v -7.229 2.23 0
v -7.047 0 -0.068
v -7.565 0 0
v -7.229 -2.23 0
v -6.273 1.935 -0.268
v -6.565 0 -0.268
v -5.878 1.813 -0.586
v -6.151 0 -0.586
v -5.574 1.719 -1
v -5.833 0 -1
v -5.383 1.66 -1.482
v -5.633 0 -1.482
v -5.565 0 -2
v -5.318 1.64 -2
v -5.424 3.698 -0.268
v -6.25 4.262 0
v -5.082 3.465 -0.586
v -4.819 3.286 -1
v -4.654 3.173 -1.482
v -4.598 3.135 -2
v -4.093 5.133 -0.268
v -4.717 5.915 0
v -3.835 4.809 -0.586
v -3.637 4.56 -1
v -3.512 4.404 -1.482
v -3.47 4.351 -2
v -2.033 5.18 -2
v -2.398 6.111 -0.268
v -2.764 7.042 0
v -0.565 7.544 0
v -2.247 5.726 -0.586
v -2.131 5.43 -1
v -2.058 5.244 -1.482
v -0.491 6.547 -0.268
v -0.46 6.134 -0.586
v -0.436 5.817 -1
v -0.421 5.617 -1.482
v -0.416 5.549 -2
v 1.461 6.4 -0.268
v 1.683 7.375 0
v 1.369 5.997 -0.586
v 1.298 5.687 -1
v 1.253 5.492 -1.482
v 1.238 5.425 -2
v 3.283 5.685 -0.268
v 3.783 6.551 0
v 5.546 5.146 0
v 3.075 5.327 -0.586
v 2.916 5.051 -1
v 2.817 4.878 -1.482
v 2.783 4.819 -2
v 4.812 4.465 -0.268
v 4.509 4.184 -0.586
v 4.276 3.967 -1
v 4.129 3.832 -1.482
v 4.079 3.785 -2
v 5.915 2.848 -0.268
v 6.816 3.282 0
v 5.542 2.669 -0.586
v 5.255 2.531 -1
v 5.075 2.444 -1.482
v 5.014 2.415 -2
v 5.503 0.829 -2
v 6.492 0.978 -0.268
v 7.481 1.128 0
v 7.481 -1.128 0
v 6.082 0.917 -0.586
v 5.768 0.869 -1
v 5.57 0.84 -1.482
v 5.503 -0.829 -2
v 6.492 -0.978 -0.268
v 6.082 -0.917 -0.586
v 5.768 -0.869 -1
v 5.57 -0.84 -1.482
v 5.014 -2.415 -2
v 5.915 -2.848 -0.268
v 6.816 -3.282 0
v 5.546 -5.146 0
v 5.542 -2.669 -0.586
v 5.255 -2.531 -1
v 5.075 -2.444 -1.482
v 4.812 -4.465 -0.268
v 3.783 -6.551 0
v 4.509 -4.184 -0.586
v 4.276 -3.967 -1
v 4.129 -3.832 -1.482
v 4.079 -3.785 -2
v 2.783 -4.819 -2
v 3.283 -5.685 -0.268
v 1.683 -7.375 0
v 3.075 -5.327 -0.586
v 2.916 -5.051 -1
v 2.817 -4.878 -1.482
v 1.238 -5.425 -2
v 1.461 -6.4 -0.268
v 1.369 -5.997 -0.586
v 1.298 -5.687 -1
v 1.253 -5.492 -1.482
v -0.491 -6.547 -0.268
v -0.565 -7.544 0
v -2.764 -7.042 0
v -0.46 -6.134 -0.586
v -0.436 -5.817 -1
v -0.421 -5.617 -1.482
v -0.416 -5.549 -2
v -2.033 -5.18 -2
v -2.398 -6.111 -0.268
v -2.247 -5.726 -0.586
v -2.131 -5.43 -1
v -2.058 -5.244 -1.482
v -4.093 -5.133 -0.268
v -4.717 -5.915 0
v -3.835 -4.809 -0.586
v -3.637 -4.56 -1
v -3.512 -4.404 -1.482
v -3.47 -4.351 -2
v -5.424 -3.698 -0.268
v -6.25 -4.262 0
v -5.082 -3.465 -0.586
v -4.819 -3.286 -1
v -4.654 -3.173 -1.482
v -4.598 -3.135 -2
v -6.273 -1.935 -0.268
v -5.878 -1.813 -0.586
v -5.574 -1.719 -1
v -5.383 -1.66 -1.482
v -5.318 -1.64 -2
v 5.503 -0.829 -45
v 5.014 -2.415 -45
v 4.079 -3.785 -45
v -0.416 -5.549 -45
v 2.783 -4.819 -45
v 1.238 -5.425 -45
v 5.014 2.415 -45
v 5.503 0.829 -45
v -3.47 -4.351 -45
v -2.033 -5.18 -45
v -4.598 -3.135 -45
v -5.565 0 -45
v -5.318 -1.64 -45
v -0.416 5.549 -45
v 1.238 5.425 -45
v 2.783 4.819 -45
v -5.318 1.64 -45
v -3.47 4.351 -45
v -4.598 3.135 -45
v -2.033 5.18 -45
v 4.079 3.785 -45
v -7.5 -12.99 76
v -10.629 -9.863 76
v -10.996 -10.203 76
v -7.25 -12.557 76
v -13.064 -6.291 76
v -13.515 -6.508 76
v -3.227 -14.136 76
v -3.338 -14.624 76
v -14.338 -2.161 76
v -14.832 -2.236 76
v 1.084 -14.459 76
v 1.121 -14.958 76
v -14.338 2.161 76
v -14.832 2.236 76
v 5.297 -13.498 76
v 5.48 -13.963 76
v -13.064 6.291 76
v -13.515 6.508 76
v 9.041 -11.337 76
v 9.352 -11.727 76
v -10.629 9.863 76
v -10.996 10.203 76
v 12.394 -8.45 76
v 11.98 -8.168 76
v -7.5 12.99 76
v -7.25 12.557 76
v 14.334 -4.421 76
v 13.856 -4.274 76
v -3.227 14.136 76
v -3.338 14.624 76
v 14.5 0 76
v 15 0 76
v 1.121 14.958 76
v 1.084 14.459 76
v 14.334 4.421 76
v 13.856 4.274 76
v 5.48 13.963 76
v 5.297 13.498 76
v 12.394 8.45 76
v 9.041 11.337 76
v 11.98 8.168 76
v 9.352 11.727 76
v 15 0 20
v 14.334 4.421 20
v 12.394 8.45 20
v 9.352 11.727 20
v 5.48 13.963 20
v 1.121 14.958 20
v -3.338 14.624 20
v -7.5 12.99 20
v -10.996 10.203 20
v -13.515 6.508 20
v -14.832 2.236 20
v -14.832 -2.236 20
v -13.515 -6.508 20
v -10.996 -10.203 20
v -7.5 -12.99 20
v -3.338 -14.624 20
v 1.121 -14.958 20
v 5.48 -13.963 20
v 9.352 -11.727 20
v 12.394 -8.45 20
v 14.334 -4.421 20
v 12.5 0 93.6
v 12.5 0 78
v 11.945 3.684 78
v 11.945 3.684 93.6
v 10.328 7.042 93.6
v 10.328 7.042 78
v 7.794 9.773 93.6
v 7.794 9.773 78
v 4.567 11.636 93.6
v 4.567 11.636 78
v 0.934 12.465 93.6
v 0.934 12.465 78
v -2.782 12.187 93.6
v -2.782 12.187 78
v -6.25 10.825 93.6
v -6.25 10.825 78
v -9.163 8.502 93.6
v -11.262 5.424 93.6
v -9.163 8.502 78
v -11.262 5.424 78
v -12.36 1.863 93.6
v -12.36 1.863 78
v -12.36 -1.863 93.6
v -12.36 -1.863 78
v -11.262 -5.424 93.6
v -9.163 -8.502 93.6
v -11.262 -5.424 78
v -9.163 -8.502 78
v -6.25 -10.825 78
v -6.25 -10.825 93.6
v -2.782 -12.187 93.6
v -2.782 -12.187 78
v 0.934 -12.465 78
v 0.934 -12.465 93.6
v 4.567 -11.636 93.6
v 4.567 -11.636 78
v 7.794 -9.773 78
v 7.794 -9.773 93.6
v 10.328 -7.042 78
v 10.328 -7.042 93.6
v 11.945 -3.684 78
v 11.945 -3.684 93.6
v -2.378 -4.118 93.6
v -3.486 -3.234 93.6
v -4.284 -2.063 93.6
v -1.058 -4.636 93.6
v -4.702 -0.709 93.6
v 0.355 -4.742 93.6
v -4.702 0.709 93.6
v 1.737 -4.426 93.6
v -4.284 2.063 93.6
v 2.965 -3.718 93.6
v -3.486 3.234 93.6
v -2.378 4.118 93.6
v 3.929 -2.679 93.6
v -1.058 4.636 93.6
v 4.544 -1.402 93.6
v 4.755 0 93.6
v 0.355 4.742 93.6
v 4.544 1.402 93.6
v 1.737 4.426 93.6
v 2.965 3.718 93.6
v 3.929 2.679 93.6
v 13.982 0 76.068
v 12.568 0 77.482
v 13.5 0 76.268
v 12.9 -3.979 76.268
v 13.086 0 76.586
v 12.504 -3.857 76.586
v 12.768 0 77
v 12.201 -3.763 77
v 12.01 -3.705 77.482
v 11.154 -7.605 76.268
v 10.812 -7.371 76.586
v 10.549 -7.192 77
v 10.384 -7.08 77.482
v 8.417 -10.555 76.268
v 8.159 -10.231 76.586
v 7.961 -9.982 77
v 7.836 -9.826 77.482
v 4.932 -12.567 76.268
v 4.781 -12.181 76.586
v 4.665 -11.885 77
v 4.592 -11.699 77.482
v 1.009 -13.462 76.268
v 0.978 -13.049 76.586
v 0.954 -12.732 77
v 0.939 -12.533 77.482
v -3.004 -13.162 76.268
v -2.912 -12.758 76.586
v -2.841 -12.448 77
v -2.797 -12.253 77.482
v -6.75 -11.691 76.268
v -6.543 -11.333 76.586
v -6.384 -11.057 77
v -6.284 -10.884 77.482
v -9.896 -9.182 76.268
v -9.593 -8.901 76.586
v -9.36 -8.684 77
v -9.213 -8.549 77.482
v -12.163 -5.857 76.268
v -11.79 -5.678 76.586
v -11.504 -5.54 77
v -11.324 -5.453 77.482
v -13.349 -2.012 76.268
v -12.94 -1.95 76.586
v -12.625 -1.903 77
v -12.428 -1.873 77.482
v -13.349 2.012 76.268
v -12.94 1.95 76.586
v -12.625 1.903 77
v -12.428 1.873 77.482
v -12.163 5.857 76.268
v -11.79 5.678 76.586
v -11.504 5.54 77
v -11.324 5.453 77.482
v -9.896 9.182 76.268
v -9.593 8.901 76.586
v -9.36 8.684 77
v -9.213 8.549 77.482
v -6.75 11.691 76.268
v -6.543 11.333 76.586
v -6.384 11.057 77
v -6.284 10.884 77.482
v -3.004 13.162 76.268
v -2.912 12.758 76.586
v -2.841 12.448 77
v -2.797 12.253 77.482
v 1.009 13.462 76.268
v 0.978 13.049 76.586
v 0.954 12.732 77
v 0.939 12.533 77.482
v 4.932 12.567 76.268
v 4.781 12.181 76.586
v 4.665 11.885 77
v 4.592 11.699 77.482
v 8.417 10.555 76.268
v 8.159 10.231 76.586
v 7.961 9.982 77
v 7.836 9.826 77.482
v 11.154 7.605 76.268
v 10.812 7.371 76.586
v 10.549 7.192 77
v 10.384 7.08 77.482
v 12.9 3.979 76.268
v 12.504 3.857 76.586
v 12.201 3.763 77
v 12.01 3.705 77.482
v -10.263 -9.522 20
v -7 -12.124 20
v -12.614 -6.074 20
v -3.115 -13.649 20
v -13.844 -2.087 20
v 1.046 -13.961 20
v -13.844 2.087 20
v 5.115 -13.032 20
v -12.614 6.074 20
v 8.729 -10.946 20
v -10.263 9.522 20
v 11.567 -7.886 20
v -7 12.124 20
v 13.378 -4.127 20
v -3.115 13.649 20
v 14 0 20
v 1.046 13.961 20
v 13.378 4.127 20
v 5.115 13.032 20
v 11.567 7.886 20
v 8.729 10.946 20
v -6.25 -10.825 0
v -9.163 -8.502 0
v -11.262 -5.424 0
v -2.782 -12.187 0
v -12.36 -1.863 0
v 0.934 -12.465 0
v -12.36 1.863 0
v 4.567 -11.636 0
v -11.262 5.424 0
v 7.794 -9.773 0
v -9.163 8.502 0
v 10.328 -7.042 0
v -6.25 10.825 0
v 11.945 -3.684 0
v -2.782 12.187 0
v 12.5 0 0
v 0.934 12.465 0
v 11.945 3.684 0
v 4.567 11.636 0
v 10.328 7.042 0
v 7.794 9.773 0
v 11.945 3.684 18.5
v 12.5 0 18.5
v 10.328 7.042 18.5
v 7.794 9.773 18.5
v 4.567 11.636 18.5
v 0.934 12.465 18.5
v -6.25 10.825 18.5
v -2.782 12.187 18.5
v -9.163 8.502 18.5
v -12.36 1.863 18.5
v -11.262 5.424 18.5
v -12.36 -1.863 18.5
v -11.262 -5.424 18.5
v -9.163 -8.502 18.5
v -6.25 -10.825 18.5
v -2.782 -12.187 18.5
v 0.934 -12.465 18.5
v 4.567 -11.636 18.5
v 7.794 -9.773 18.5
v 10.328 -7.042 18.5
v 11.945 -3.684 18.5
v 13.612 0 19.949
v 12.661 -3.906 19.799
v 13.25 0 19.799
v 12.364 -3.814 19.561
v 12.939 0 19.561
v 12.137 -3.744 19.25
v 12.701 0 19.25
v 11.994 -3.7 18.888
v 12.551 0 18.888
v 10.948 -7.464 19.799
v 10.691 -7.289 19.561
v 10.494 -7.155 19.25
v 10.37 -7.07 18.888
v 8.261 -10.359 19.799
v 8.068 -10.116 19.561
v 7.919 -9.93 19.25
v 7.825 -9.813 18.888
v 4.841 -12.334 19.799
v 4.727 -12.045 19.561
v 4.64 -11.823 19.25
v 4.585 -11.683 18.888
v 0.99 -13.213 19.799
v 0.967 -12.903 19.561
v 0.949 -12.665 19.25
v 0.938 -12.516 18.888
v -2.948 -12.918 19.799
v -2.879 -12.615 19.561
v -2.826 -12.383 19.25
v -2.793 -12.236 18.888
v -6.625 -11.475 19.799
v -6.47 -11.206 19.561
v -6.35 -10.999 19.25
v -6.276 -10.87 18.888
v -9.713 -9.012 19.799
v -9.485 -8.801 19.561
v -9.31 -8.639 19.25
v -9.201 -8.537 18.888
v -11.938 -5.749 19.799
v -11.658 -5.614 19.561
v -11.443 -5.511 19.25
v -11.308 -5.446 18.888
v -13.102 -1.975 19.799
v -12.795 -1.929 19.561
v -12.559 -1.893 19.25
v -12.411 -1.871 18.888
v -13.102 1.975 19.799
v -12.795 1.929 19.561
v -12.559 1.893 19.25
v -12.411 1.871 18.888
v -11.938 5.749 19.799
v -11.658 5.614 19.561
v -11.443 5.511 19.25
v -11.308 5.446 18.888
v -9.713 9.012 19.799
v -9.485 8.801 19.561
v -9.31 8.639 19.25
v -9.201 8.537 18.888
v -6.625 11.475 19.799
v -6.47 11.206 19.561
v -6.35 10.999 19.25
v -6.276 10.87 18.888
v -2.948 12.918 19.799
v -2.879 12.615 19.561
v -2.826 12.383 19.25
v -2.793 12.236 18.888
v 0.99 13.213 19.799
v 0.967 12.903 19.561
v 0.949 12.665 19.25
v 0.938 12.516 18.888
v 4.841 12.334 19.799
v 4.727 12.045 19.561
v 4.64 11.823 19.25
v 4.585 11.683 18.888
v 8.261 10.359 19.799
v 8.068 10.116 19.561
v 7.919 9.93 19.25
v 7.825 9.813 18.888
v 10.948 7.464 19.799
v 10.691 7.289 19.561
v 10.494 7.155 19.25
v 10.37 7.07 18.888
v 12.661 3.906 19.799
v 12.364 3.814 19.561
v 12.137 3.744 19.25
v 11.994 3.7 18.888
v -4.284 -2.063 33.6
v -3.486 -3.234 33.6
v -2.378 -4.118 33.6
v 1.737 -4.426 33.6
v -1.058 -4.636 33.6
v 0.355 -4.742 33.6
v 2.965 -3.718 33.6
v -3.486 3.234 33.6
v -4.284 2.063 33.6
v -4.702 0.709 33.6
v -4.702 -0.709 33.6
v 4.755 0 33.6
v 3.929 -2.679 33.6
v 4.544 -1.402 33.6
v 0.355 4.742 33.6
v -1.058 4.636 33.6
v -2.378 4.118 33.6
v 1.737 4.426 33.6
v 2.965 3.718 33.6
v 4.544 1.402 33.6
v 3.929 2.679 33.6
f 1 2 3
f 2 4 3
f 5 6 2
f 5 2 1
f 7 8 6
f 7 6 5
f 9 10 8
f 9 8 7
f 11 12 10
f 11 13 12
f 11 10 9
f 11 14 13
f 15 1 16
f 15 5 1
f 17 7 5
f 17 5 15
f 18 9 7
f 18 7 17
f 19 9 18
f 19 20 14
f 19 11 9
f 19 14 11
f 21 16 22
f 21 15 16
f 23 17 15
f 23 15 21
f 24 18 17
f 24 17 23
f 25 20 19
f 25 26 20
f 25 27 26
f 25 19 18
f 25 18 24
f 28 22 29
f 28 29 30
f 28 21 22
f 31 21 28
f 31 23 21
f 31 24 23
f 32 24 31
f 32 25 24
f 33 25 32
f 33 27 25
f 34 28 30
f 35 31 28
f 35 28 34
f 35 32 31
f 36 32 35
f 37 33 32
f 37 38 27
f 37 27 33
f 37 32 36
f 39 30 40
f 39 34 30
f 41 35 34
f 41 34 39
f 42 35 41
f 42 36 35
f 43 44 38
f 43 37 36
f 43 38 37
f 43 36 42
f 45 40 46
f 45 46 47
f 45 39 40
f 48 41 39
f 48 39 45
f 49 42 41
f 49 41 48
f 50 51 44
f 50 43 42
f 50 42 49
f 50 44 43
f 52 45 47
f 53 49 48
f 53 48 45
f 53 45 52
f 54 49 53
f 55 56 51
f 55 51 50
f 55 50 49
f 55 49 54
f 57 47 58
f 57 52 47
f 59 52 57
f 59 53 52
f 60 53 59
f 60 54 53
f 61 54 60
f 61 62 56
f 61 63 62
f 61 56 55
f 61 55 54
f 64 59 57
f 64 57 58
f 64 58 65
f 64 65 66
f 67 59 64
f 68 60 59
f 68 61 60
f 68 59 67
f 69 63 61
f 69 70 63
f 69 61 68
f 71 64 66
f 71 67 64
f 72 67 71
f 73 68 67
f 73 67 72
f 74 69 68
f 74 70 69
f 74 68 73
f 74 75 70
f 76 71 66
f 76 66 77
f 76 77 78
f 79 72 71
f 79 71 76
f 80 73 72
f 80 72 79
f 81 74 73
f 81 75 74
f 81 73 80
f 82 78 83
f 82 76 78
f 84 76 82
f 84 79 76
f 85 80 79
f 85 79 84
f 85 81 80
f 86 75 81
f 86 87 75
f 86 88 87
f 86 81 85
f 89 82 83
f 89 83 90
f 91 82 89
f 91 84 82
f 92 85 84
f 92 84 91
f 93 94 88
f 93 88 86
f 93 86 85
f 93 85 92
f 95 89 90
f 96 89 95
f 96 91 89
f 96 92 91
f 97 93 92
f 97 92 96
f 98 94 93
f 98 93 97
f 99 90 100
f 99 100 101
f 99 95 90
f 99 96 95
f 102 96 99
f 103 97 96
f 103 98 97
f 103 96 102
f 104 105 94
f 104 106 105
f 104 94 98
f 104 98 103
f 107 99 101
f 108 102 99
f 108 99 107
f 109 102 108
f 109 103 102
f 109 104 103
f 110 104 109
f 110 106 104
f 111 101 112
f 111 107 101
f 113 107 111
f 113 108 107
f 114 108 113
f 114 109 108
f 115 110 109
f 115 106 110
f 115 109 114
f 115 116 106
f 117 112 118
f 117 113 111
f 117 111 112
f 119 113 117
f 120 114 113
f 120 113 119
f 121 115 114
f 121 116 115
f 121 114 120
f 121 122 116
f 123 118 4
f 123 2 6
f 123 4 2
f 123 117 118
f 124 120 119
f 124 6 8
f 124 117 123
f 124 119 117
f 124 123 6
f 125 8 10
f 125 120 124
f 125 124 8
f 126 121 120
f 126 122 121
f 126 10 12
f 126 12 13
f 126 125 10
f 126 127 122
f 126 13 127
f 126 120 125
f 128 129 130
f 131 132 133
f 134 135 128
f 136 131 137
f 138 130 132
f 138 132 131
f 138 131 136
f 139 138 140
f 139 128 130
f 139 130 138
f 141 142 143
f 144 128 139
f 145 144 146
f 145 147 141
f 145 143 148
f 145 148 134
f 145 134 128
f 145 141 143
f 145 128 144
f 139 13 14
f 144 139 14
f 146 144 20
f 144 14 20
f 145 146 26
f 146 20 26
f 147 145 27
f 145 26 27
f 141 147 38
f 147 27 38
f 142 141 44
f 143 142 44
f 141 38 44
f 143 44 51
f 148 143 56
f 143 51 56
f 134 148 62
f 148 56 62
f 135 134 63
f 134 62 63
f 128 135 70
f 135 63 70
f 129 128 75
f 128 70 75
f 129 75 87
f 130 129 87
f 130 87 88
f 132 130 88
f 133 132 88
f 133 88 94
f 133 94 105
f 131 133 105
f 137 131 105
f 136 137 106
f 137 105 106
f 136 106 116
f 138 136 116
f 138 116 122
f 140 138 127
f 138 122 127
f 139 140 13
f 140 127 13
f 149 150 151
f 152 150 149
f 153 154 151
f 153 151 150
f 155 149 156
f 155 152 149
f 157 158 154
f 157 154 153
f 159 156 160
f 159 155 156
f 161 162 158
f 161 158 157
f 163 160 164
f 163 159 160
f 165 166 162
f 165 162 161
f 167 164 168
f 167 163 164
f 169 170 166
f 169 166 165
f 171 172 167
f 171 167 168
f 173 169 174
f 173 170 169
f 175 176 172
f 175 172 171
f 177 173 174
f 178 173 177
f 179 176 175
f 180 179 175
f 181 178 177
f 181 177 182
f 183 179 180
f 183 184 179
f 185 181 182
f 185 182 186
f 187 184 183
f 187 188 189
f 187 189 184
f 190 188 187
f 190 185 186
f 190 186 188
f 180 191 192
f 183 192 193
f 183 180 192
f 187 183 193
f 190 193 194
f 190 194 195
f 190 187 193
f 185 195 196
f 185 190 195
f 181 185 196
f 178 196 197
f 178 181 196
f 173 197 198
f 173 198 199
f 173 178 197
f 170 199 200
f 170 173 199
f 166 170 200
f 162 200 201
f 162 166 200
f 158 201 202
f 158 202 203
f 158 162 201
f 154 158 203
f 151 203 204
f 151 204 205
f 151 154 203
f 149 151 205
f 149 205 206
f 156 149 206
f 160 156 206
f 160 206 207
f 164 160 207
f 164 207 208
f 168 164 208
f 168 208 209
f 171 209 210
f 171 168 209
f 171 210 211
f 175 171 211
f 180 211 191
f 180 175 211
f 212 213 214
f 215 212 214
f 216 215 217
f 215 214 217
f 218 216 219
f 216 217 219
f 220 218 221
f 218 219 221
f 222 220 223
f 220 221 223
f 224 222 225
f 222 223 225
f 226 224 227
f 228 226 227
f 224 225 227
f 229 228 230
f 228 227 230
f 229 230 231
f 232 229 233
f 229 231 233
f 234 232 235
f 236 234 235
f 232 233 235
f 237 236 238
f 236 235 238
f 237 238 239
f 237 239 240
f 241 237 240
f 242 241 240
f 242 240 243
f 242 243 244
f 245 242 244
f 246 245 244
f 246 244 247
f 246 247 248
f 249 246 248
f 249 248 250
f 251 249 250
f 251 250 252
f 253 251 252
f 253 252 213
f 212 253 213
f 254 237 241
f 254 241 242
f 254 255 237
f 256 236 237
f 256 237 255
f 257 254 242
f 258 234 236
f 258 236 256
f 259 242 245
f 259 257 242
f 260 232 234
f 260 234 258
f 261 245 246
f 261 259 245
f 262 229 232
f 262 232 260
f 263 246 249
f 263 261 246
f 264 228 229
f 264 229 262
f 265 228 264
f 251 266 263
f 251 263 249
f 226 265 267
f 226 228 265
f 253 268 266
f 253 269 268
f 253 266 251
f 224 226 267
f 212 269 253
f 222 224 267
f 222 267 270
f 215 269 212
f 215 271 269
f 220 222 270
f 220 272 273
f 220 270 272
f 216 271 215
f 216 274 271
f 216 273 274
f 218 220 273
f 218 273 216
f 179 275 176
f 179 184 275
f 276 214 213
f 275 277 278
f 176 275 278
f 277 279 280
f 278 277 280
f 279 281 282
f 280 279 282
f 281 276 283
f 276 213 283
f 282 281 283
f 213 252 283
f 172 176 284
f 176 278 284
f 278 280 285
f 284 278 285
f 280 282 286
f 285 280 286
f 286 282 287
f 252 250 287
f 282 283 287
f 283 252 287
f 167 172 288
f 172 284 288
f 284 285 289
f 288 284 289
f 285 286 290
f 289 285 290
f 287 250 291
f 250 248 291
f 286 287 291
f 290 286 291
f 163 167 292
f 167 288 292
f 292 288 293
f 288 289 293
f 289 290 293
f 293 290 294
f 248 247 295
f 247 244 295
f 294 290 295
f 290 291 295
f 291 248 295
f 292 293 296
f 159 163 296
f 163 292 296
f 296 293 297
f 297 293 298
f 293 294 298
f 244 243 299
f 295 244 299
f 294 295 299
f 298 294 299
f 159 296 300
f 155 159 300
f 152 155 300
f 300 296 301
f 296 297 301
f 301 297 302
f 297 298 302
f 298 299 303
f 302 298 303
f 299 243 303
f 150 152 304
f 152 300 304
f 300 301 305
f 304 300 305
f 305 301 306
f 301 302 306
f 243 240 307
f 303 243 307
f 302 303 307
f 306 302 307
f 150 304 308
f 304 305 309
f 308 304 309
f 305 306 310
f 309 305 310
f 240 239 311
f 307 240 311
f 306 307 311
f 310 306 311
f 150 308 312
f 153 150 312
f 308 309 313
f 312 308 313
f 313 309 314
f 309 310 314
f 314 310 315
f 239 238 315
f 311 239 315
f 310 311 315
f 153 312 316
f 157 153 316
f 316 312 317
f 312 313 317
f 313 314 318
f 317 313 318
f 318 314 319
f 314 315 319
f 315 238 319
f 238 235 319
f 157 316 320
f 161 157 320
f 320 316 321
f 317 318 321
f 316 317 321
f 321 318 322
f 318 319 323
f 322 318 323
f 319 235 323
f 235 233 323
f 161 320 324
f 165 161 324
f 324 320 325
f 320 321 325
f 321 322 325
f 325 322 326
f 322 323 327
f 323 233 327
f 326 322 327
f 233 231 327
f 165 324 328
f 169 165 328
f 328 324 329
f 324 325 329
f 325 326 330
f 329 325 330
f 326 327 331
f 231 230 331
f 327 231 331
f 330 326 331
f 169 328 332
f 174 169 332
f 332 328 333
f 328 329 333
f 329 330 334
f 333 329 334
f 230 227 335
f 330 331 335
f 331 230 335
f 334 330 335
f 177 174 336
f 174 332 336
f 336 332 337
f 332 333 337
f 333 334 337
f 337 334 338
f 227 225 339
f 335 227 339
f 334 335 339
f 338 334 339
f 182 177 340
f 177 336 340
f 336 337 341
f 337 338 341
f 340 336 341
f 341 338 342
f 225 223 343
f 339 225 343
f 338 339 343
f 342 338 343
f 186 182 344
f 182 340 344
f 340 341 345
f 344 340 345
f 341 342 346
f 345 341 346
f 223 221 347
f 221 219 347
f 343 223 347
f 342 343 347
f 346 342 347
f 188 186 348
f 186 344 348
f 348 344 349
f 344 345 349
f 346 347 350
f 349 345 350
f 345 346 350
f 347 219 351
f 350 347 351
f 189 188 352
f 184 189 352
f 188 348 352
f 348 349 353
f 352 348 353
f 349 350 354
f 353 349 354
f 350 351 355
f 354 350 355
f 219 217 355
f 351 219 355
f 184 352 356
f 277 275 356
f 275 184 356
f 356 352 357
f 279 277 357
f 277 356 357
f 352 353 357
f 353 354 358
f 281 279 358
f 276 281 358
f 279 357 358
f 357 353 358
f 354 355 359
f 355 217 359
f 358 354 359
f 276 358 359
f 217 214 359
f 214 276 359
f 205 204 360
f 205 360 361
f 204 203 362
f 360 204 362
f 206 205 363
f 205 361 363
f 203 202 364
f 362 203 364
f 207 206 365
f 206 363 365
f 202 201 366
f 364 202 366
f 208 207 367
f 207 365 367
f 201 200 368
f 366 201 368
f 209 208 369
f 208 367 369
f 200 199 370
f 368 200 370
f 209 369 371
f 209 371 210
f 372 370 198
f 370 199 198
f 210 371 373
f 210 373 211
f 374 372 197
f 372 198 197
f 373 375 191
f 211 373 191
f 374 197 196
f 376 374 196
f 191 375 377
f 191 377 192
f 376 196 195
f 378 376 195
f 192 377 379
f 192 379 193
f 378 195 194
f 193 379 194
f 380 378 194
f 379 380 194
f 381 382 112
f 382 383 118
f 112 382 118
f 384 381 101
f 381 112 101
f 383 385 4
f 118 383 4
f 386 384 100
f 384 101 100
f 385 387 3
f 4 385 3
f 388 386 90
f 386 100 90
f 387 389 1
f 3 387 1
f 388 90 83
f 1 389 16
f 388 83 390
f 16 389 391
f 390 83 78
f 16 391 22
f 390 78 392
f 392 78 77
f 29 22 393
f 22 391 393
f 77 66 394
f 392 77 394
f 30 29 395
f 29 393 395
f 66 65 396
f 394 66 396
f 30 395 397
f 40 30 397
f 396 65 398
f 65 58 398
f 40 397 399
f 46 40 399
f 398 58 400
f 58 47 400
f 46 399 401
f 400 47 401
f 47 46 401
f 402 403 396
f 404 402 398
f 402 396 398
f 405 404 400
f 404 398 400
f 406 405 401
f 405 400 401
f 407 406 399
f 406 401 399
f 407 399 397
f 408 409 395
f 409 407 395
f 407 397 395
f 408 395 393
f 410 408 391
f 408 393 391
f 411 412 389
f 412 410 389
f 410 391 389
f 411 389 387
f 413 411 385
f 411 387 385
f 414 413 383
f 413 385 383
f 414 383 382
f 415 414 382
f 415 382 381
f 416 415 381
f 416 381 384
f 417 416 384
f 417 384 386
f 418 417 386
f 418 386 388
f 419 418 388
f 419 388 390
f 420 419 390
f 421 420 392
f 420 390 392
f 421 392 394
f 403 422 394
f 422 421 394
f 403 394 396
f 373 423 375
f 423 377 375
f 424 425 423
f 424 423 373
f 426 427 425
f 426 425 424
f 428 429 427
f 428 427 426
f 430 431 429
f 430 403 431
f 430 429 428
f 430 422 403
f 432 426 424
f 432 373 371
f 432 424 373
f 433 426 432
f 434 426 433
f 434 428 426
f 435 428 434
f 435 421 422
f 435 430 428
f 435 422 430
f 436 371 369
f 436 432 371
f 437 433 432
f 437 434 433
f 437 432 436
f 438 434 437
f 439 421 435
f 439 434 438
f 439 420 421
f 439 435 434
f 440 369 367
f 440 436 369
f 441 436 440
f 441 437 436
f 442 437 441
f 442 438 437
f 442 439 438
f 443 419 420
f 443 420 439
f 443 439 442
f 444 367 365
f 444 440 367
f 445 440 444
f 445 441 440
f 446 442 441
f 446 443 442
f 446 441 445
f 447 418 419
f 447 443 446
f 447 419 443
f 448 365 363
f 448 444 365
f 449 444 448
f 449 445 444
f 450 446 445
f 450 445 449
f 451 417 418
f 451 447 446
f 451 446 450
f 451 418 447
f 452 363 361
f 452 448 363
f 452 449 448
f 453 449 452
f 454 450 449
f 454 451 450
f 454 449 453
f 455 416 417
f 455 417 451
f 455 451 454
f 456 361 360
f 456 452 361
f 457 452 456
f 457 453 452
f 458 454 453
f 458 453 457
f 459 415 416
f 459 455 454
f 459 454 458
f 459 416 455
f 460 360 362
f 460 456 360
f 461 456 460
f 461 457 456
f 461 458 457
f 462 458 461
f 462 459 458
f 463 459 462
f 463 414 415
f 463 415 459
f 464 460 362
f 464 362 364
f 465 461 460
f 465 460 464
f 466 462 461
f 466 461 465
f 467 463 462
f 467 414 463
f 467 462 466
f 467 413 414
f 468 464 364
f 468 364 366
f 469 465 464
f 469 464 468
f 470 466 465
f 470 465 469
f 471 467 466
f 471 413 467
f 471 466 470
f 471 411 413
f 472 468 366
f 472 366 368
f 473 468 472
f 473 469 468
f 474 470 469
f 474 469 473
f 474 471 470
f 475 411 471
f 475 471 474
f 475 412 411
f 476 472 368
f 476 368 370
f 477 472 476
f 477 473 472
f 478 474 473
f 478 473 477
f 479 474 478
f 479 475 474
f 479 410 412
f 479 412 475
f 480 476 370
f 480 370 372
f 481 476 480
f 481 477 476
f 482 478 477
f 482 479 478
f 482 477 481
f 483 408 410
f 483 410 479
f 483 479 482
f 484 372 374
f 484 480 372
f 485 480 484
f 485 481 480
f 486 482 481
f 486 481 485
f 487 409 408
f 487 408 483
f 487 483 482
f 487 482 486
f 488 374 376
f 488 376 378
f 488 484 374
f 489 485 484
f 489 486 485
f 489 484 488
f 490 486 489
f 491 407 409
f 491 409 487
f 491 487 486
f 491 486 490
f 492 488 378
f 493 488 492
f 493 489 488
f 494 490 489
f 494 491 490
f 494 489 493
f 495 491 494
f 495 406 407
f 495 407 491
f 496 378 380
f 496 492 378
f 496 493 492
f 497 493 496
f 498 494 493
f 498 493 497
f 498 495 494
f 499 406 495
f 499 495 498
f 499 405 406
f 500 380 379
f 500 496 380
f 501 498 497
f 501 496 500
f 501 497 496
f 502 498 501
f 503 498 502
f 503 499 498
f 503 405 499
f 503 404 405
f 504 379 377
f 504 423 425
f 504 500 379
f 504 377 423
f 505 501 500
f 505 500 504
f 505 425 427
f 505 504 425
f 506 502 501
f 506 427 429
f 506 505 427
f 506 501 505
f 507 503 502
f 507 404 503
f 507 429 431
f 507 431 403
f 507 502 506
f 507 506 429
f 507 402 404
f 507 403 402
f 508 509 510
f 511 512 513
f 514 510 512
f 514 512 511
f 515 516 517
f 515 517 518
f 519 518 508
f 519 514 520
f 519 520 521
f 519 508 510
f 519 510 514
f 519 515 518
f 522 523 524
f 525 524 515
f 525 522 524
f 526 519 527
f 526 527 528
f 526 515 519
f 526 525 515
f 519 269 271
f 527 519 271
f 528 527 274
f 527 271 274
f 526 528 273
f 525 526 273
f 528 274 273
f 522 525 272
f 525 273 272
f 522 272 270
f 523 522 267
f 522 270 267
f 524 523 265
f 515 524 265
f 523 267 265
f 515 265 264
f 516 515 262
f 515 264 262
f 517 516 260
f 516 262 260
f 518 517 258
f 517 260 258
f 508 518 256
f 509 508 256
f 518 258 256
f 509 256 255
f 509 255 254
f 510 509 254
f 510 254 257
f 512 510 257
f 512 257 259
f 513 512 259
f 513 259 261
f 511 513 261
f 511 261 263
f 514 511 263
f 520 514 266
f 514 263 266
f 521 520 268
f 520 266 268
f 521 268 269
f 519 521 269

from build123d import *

# Parameters (mm, degrees)
SKETCH1_R           = 12.5
BOSS_EXTRUDE1_DEPTH = 93.6
SKETCH2_R           = 15
BOSS_EXTRUDE2_DEPTH = 56
SKETCH3_R           = 5.565
BOSS_EXTRUDE3_DEPTH = 45
SKETCH4_R           = 4.755
CUT_EXTRUDE1_DEPTH  = 60
FILLET2_R           = 2
FILLET3_R           = 1.5
FILLET4_R           = 2


with BuildPart() as part:
    # Sketch1 → Boss-Extrude1 (new body)
    with BuildSketch(Plane.XY):
        Circle(SKETCH1_R)
    extrude(amount=BOSS_EXTRUDE1_DEPTH)

    # Sketch2 → Boss-Extrude2 (add)
    with BuildSketch(Plane.XY.offset(76)):
        Circle(SKETCH2_R)
    extrude(amount=-BOSS_EXTRUDE2_DEPTH)

    # Sketch3 → Boss-Extrude3 (add)
    with BuildSketch(Plane(origin=(0, 0, 0), x_dir=(-1, 0, 0), z_dir=(0, 0, -1))):
        Circle(SKETCH3_R)
    extrude(amount=BOSS_EXTRUDE3_DEPTH)

    # Sketch4 → Cut-Extrude1 (cut)
    with BuildSketch(Plane.XY.offset(93.6)):
        Circle(SKETCH4_R)
    extrude(amount=-CUT_EXTRUDE1_DEPTH, mode=Mode.SUBTRACT)

    # Fillet2
    fillet2_edges = [part.edges().sort_by_distance(p)[0] for p in [
        (-12.5, 0, 76),
    ]]
    fillet(fillet2_edges, radius=FILLET2_R)

    # Fillet3
    fillet3_edges = [part.edges().sort_by_distance(p)[0] for p in [
        (-12.5, 0, 20),
    ]]
    fillet(fillet3_edges, radius=FILLET3_R)

    # Fillet4
    fillet4_edges = [part.edges().sort_by_distance(p)[0] for p in [
        (5.565, 0, 0),
    ]]
    fillet(fillet4_edges, radius=FILLET4_R)


solid = part.part
